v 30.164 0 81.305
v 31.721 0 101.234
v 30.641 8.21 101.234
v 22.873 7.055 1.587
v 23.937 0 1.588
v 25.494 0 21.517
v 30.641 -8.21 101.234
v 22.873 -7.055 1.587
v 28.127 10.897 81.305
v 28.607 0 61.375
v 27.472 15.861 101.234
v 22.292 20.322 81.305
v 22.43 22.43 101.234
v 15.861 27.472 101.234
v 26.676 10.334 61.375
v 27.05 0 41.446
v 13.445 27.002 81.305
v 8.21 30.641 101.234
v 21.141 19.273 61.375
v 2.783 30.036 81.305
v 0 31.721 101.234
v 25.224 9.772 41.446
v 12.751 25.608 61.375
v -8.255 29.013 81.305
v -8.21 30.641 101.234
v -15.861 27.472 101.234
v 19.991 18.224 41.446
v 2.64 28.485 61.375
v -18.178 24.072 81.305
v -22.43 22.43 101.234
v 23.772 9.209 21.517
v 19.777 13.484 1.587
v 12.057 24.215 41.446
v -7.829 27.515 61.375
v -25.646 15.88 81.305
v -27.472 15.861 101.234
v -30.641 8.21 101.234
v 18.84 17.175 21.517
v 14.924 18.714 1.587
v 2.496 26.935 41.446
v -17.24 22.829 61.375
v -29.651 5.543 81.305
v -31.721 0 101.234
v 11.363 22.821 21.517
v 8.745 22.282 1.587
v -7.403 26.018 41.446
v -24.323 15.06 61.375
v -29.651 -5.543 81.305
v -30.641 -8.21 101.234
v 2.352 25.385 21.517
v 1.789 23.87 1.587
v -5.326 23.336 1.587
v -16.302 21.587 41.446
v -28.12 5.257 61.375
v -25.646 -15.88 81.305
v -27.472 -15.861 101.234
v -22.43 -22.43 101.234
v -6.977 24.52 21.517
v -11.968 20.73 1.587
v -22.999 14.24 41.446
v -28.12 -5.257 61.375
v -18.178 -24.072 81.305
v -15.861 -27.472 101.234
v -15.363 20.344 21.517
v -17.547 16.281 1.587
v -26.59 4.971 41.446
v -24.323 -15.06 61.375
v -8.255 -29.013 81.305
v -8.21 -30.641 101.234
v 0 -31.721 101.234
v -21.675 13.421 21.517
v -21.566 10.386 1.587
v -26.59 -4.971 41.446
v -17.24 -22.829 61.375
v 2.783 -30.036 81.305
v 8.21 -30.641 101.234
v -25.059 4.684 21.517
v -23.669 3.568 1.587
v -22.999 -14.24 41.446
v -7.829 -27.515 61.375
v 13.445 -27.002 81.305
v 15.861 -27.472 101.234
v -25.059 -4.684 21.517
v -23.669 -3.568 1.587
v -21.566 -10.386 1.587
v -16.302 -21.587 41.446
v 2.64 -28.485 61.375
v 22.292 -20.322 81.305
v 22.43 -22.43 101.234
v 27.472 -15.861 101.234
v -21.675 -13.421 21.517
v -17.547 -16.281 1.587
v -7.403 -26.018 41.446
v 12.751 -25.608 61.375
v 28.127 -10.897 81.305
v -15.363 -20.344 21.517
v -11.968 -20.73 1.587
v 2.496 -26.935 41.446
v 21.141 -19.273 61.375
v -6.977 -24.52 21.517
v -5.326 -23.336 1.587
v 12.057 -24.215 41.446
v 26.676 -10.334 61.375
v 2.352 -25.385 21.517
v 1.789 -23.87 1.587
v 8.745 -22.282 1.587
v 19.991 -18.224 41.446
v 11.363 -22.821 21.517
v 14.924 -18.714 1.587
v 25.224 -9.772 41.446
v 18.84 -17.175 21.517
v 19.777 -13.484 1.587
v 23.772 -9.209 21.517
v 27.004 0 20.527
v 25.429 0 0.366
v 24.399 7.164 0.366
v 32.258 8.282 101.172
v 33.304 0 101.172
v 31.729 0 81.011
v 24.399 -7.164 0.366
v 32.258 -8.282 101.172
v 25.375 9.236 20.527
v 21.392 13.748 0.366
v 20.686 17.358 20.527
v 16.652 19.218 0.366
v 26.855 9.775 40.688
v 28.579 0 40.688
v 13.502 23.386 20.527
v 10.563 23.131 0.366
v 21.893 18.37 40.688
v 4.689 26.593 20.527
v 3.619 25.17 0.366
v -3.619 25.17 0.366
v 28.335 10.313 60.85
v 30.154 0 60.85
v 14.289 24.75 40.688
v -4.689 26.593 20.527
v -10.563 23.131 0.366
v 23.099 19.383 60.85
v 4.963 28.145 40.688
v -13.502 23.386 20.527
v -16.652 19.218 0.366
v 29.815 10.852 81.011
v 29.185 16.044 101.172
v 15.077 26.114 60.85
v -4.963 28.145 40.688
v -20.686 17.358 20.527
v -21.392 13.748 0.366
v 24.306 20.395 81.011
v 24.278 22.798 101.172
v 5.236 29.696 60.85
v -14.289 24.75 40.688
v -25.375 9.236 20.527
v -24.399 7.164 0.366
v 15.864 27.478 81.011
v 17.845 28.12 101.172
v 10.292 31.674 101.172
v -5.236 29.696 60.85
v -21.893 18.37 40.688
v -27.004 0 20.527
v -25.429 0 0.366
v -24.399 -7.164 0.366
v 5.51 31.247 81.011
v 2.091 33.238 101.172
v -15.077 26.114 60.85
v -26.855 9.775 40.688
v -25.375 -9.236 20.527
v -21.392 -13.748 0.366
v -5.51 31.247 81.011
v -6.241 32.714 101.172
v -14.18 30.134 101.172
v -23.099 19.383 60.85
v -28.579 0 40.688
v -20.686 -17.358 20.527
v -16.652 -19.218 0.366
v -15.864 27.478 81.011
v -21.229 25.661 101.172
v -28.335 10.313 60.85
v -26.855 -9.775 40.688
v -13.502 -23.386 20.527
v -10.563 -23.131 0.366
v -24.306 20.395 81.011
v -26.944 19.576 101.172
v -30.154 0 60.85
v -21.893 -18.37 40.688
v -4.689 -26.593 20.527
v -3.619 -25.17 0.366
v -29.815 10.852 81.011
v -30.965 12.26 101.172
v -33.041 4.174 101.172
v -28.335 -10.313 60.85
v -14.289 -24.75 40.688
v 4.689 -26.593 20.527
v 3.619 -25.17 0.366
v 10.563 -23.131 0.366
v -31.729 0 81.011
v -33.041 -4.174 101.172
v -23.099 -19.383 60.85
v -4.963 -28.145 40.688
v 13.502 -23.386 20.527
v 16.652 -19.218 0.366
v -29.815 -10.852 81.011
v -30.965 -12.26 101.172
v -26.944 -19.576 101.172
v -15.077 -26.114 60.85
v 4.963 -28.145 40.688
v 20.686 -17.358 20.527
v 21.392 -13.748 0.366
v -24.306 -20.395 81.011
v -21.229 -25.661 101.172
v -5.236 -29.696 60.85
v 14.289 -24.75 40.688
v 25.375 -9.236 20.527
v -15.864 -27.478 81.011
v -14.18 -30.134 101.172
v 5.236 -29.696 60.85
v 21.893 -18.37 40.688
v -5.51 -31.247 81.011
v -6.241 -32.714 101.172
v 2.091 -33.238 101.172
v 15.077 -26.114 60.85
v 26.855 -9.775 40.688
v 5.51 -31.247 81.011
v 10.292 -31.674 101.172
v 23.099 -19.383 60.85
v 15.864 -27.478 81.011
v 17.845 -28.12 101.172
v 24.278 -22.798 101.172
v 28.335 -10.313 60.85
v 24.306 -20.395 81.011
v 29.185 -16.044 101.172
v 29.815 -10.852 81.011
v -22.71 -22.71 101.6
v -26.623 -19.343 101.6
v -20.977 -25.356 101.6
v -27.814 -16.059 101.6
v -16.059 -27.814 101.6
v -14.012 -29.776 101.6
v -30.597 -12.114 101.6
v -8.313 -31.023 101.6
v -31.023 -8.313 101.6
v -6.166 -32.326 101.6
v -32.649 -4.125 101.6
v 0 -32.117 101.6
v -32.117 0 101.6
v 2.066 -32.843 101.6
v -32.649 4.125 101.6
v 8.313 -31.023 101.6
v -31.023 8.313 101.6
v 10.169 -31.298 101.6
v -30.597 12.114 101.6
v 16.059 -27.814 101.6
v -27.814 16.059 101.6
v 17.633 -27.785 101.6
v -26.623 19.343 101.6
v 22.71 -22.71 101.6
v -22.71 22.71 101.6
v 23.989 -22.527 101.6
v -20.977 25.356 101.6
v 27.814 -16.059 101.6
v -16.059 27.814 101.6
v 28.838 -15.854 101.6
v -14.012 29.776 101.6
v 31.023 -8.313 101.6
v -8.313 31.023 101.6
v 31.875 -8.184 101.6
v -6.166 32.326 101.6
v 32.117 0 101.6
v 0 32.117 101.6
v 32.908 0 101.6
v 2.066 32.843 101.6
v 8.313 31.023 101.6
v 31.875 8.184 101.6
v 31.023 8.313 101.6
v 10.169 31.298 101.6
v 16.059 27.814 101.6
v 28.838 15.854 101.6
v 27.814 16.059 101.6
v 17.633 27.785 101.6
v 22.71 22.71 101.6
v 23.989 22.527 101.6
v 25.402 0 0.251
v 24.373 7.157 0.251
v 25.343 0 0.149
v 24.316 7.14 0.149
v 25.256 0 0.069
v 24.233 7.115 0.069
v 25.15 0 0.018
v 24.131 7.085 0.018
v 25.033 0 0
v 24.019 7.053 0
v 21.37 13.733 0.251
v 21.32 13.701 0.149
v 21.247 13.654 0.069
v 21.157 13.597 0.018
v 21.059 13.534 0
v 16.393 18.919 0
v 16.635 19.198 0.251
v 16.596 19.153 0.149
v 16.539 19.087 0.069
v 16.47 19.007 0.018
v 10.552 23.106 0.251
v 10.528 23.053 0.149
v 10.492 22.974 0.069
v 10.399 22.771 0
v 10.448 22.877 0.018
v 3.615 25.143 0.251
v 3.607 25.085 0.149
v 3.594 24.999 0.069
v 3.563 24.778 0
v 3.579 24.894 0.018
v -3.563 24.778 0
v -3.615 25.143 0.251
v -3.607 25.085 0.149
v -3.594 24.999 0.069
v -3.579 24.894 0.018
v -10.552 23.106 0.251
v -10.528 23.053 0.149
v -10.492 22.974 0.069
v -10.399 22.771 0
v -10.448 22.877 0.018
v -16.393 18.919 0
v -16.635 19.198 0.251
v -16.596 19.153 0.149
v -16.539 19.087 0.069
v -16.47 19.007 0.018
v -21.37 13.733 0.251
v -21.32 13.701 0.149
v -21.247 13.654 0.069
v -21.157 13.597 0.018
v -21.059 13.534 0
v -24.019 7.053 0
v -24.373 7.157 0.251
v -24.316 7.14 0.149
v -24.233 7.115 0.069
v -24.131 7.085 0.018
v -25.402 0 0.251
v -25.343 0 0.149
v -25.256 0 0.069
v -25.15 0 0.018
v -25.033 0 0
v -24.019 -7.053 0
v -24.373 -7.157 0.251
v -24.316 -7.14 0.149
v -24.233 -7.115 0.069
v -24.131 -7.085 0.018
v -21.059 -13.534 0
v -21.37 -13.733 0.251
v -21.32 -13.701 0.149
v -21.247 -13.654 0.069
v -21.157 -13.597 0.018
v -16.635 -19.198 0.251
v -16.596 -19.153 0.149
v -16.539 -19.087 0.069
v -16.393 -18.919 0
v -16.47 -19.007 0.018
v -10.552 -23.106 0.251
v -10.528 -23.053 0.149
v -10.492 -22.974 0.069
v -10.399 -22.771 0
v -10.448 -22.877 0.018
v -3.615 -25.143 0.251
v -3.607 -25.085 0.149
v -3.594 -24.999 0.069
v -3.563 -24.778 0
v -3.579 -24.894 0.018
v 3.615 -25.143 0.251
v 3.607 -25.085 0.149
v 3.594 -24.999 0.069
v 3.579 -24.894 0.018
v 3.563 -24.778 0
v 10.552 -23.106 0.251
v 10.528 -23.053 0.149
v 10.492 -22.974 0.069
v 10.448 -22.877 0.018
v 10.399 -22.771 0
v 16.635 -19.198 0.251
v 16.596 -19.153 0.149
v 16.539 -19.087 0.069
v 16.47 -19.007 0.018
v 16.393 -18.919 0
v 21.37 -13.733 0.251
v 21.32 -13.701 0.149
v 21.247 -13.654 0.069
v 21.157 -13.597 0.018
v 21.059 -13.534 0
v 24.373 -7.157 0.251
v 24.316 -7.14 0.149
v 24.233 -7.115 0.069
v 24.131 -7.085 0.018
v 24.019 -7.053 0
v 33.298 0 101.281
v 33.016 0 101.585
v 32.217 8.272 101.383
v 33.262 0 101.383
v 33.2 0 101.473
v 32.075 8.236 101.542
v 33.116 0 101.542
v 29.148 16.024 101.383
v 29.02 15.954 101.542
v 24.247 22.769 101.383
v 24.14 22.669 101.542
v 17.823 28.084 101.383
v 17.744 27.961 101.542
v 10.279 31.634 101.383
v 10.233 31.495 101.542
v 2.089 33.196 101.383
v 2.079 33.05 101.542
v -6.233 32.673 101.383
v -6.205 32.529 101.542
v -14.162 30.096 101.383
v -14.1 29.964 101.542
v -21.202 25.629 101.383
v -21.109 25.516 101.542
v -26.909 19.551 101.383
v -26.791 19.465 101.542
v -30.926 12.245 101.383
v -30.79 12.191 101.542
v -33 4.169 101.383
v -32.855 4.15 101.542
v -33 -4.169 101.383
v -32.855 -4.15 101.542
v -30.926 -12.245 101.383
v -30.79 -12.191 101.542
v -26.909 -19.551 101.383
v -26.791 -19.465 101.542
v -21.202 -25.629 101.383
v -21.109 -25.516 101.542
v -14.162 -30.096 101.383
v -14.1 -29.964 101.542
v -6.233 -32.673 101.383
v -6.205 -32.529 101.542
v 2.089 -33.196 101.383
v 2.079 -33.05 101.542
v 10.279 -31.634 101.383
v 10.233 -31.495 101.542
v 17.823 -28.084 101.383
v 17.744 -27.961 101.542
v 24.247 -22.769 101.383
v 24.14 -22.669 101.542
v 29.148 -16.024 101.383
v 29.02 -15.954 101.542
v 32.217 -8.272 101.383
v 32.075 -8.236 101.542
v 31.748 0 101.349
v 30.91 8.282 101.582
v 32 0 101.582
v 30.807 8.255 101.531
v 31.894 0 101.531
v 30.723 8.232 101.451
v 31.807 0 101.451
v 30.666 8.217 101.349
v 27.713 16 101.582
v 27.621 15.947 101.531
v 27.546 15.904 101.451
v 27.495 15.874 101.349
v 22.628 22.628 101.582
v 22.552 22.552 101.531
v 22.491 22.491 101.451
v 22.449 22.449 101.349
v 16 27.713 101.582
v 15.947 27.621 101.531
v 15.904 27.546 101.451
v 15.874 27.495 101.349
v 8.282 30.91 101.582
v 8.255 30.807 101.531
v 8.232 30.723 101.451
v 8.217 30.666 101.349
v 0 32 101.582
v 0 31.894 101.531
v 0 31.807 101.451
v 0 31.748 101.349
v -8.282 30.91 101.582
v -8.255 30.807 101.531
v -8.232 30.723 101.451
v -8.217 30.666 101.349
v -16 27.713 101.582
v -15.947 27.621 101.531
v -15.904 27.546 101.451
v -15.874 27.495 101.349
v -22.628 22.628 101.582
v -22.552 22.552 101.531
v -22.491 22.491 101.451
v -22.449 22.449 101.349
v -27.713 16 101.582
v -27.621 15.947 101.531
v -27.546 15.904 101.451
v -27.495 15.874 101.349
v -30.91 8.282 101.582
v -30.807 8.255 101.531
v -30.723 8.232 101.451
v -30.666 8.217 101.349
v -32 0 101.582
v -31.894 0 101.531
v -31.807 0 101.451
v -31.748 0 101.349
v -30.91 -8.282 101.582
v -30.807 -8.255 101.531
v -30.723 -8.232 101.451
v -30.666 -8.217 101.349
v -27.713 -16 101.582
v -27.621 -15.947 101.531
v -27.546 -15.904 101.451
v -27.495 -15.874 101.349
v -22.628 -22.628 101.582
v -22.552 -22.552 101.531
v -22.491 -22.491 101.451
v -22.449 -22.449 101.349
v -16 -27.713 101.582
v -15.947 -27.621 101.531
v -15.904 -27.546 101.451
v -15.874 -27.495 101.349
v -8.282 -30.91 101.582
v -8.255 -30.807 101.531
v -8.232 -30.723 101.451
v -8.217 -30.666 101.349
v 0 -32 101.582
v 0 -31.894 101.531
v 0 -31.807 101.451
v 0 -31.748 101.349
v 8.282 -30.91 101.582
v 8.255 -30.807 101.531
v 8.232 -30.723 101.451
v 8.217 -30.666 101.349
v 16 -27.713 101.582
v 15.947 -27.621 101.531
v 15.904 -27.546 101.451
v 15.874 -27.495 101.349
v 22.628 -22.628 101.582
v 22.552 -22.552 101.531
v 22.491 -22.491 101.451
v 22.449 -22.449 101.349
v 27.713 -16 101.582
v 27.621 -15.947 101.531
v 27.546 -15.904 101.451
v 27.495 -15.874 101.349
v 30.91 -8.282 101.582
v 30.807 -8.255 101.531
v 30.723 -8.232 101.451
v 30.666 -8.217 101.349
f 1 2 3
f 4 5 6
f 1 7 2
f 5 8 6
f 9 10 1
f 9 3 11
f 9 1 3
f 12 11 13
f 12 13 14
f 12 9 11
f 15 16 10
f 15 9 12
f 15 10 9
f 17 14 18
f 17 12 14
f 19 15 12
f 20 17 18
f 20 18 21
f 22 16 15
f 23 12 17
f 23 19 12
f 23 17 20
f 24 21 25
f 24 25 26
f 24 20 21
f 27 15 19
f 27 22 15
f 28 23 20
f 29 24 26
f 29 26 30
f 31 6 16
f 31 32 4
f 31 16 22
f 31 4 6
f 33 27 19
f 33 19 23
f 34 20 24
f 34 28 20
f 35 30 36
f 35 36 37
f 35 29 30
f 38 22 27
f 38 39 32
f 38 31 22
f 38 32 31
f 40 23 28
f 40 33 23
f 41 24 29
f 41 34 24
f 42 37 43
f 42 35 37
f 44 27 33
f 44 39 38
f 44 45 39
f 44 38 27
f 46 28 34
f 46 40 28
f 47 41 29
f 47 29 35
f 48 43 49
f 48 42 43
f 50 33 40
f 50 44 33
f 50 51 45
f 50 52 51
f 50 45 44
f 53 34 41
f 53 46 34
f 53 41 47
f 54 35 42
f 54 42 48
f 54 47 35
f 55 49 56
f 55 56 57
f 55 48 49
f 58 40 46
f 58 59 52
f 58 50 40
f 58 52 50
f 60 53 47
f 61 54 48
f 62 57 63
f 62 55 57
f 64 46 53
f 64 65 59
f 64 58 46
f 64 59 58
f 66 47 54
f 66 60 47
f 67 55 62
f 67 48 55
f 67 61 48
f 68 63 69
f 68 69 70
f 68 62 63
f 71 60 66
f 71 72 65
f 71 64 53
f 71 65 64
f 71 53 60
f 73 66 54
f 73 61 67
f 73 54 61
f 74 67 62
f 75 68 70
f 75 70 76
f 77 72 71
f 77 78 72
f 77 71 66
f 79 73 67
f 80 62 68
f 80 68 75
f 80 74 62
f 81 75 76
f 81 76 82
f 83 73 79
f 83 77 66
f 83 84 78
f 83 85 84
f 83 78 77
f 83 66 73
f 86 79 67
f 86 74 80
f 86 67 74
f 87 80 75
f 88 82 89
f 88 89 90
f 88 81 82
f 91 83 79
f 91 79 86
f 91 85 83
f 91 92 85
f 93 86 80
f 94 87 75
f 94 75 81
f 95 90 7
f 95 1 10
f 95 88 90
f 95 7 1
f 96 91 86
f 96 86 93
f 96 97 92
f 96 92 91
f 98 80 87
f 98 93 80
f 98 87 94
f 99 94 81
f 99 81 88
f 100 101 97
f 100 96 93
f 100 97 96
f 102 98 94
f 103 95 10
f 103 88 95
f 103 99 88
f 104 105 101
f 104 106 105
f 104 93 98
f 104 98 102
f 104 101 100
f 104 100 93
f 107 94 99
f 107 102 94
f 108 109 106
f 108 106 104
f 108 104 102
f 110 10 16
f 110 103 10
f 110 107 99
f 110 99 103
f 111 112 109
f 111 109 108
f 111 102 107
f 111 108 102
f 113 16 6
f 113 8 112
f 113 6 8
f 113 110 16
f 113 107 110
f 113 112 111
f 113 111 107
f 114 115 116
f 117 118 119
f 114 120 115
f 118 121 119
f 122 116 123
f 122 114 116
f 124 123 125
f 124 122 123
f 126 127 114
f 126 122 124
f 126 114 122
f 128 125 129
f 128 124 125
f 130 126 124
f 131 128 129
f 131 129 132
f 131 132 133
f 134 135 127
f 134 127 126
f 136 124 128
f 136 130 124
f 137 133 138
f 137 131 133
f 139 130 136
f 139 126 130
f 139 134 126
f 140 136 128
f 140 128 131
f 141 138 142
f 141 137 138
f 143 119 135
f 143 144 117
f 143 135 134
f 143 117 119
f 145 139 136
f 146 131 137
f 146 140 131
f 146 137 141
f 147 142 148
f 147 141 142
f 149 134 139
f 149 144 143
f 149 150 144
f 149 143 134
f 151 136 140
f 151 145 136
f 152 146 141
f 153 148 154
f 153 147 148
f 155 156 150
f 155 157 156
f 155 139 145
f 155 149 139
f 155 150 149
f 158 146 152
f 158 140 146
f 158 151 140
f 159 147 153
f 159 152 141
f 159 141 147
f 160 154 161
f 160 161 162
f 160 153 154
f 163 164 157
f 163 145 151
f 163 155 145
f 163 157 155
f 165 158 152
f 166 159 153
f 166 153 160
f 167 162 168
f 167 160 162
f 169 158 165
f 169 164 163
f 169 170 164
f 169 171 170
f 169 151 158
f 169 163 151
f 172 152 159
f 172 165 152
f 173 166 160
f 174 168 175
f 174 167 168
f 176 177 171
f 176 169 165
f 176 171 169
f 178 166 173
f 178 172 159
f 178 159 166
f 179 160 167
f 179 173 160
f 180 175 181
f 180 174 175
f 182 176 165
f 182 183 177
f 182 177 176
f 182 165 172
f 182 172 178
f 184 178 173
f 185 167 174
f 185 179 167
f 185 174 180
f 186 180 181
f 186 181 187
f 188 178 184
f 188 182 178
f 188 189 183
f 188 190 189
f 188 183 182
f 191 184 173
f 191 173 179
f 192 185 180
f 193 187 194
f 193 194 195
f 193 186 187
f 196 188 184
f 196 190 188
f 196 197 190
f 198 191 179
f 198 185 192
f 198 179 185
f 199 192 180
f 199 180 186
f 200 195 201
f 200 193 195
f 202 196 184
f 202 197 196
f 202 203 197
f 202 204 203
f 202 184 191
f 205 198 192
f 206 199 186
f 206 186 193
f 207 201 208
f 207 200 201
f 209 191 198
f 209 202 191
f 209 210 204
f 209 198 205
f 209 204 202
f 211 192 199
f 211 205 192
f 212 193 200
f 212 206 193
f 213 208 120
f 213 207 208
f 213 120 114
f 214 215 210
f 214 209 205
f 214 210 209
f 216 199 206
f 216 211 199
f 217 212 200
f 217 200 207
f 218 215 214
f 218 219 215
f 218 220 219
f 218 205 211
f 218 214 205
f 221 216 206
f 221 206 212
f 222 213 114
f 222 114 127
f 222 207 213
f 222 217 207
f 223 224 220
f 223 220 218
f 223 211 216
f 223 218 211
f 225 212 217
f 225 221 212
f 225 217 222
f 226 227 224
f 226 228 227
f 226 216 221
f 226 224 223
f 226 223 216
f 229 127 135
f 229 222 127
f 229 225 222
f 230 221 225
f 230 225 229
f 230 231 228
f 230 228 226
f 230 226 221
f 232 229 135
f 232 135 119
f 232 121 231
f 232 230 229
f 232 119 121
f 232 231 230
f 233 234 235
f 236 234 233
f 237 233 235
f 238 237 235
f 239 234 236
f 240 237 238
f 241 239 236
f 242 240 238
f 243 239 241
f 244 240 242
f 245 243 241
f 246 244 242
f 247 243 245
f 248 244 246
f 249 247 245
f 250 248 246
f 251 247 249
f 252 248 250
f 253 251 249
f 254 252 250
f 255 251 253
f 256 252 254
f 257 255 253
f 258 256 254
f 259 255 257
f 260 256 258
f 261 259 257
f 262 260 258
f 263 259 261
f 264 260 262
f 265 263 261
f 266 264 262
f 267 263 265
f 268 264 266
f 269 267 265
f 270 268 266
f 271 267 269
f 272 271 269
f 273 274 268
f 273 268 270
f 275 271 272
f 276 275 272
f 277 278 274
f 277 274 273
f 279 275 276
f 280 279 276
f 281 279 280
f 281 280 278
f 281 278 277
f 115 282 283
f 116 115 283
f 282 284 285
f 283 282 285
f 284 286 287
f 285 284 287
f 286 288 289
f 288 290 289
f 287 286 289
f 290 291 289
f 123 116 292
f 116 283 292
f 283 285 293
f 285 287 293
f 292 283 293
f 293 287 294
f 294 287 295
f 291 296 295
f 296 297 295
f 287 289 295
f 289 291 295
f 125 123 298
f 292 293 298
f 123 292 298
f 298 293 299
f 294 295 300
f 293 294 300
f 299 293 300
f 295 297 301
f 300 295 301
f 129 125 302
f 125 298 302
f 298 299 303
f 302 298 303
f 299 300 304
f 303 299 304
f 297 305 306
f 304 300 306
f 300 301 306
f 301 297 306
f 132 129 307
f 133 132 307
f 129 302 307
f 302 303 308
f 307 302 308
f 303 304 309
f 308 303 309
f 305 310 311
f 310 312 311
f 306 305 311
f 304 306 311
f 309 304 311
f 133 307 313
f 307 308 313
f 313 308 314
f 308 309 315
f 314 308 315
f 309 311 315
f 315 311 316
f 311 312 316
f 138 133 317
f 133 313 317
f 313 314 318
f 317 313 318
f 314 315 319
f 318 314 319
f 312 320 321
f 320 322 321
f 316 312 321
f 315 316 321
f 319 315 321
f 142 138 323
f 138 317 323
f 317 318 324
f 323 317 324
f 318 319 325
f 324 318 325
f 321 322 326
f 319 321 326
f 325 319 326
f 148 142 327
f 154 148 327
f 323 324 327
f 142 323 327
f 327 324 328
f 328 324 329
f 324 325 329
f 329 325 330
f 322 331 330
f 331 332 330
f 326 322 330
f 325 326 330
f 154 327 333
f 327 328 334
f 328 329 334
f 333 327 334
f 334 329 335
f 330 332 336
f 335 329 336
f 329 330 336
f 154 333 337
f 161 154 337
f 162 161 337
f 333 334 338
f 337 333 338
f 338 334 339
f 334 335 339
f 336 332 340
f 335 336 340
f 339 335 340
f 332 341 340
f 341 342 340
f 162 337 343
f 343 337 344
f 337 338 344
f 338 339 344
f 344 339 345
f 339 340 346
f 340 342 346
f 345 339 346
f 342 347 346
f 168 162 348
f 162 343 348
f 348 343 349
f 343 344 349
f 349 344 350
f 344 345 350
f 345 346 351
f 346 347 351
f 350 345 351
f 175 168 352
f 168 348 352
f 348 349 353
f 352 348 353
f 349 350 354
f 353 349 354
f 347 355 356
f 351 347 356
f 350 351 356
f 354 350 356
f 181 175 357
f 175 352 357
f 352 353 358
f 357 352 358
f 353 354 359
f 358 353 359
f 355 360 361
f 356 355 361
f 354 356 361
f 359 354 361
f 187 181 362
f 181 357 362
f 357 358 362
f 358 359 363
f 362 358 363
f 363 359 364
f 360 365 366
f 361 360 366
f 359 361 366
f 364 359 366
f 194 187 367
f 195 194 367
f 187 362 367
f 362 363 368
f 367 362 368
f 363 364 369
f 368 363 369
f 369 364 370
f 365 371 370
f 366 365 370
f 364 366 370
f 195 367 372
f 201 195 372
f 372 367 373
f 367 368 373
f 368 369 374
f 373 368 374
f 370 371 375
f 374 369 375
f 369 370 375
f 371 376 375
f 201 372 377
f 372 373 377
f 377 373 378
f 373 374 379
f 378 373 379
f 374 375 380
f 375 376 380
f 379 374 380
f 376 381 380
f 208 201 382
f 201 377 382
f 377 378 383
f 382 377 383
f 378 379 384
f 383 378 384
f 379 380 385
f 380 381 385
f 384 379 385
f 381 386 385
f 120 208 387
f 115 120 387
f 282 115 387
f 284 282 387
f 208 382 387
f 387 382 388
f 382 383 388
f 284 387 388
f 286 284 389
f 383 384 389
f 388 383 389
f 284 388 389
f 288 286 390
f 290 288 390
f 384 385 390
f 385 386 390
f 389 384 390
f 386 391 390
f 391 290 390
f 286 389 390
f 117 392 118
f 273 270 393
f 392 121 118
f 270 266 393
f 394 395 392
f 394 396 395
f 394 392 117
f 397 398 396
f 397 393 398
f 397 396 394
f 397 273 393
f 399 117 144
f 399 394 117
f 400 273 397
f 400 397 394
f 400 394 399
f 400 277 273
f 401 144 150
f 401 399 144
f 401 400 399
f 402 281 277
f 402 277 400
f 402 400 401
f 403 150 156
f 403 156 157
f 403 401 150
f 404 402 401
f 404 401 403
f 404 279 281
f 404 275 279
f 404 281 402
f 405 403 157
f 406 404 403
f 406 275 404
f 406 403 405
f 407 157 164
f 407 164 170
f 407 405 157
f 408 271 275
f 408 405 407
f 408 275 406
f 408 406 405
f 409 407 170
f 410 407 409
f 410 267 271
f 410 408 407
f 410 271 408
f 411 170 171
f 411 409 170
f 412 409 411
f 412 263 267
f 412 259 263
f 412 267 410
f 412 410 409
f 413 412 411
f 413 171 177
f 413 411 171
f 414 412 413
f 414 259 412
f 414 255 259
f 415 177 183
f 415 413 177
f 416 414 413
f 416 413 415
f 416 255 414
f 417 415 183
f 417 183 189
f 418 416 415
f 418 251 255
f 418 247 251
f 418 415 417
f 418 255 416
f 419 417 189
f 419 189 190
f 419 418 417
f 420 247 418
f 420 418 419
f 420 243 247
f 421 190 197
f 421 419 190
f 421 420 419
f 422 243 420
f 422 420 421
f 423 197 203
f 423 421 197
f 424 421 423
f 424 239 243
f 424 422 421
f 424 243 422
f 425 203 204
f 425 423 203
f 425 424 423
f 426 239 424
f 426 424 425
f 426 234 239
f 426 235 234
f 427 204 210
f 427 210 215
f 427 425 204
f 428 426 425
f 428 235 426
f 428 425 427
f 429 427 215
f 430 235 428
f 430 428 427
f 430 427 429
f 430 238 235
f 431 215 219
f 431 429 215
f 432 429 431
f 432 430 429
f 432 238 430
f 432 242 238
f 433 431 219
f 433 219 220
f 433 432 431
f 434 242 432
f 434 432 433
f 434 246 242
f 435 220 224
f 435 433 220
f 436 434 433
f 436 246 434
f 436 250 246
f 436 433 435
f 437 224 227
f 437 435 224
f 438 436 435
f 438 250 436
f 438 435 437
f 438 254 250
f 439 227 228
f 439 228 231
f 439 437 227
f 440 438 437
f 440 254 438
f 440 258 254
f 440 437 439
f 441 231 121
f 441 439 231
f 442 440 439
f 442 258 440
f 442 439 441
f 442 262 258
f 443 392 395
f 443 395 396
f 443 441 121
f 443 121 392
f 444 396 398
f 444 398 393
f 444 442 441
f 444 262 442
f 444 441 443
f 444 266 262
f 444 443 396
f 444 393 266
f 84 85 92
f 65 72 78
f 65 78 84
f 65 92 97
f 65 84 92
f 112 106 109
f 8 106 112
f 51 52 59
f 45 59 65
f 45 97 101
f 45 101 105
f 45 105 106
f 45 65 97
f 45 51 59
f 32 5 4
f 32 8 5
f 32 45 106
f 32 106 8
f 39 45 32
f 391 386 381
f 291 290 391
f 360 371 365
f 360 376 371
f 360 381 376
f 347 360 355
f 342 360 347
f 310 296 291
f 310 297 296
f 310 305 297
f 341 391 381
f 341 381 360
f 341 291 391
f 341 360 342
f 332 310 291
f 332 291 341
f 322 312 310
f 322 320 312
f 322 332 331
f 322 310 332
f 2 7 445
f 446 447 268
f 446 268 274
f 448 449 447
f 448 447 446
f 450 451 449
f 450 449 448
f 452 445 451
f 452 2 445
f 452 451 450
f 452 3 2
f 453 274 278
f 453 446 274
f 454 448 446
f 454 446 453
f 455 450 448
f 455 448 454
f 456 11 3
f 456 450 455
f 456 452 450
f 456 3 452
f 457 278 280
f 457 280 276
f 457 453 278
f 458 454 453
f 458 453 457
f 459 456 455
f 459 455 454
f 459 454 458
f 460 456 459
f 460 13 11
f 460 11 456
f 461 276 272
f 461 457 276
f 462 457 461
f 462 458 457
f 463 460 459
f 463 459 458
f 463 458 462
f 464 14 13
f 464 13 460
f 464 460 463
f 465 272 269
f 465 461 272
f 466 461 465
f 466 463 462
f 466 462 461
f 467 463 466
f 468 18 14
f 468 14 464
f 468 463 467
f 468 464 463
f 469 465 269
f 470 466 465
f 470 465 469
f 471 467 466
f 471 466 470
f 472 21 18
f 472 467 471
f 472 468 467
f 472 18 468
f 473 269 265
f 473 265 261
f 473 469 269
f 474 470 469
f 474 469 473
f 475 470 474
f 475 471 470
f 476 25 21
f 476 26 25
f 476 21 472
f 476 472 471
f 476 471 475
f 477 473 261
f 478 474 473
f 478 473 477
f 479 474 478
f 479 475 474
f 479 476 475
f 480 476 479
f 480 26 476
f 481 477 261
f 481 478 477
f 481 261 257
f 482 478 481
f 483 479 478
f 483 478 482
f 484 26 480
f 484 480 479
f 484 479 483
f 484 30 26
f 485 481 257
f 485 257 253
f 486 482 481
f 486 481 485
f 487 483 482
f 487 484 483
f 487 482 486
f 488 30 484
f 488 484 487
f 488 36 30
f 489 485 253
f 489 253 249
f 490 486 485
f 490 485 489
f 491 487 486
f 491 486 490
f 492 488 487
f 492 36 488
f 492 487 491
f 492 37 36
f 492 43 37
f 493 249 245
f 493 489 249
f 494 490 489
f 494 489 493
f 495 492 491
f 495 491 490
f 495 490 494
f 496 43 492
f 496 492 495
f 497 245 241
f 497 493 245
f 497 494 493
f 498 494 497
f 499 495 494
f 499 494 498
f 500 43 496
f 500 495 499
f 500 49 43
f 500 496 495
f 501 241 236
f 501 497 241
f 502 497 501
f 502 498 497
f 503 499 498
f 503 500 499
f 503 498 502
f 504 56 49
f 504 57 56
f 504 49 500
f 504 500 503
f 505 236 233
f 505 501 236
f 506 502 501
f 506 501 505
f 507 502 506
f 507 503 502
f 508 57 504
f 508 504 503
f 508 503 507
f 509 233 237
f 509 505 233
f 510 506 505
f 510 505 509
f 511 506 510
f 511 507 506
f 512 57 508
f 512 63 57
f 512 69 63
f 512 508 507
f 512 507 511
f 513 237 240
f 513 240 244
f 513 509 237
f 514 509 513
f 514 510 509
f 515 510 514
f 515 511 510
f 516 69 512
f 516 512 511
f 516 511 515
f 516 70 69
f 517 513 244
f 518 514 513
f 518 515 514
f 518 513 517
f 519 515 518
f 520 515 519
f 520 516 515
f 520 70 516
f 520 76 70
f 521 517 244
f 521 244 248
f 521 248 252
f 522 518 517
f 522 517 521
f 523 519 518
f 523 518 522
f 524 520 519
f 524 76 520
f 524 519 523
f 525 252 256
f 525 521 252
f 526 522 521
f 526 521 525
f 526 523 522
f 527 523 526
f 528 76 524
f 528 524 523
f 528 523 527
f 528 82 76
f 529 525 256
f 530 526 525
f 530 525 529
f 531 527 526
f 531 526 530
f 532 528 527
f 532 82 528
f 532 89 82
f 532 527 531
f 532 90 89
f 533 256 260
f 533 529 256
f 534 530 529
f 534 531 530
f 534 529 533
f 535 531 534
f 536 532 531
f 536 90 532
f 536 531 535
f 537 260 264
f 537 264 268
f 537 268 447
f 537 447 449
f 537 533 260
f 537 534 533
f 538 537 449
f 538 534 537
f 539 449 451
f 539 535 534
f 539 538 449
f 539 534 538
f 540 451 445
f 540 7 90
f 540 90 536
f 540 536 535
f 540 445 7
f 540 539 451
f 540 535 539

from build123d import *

# Parameters (mm, degrees)
F2_R = 0.396875
F3_R = 0.396875
F4_R = 0.396875


with BuildPart() as f1:
    # F0 (on Front) → F1 (revolve)
    with BuildSketch(Plane.XZ):
        Polygon((0, 1.5875), (0, 0), (25.4, 0), (33.3375, 101.6), (31.75, 101.6), (23.936523, 1.5875), align=None)
    revolve(axis=Axis((0, 0, 50.8), (0, 0, 1)))

    # F2
    f2_edges = [f1.edges().sort_by_distance(p)[0] for p in [
        (-33.3375, 0, 101.6),
    ]]
    fillet(f2_edges, radius=F2_R)

    # F3
    f3_edges = [f1.edges().sort_by_distance(p)[0] for p in [
        (-31.75, 0, 101.6),
    ]]
    fillet(f3_edges, radius=F3_R)

    # F4
    f4_edges = [f1.edges().sort_by_distance(p)[0] for p in [
        (-25.4, 0, 0),
    ]]
    fillet(f4_edges, radius=F4_R)


solid = f1.part
